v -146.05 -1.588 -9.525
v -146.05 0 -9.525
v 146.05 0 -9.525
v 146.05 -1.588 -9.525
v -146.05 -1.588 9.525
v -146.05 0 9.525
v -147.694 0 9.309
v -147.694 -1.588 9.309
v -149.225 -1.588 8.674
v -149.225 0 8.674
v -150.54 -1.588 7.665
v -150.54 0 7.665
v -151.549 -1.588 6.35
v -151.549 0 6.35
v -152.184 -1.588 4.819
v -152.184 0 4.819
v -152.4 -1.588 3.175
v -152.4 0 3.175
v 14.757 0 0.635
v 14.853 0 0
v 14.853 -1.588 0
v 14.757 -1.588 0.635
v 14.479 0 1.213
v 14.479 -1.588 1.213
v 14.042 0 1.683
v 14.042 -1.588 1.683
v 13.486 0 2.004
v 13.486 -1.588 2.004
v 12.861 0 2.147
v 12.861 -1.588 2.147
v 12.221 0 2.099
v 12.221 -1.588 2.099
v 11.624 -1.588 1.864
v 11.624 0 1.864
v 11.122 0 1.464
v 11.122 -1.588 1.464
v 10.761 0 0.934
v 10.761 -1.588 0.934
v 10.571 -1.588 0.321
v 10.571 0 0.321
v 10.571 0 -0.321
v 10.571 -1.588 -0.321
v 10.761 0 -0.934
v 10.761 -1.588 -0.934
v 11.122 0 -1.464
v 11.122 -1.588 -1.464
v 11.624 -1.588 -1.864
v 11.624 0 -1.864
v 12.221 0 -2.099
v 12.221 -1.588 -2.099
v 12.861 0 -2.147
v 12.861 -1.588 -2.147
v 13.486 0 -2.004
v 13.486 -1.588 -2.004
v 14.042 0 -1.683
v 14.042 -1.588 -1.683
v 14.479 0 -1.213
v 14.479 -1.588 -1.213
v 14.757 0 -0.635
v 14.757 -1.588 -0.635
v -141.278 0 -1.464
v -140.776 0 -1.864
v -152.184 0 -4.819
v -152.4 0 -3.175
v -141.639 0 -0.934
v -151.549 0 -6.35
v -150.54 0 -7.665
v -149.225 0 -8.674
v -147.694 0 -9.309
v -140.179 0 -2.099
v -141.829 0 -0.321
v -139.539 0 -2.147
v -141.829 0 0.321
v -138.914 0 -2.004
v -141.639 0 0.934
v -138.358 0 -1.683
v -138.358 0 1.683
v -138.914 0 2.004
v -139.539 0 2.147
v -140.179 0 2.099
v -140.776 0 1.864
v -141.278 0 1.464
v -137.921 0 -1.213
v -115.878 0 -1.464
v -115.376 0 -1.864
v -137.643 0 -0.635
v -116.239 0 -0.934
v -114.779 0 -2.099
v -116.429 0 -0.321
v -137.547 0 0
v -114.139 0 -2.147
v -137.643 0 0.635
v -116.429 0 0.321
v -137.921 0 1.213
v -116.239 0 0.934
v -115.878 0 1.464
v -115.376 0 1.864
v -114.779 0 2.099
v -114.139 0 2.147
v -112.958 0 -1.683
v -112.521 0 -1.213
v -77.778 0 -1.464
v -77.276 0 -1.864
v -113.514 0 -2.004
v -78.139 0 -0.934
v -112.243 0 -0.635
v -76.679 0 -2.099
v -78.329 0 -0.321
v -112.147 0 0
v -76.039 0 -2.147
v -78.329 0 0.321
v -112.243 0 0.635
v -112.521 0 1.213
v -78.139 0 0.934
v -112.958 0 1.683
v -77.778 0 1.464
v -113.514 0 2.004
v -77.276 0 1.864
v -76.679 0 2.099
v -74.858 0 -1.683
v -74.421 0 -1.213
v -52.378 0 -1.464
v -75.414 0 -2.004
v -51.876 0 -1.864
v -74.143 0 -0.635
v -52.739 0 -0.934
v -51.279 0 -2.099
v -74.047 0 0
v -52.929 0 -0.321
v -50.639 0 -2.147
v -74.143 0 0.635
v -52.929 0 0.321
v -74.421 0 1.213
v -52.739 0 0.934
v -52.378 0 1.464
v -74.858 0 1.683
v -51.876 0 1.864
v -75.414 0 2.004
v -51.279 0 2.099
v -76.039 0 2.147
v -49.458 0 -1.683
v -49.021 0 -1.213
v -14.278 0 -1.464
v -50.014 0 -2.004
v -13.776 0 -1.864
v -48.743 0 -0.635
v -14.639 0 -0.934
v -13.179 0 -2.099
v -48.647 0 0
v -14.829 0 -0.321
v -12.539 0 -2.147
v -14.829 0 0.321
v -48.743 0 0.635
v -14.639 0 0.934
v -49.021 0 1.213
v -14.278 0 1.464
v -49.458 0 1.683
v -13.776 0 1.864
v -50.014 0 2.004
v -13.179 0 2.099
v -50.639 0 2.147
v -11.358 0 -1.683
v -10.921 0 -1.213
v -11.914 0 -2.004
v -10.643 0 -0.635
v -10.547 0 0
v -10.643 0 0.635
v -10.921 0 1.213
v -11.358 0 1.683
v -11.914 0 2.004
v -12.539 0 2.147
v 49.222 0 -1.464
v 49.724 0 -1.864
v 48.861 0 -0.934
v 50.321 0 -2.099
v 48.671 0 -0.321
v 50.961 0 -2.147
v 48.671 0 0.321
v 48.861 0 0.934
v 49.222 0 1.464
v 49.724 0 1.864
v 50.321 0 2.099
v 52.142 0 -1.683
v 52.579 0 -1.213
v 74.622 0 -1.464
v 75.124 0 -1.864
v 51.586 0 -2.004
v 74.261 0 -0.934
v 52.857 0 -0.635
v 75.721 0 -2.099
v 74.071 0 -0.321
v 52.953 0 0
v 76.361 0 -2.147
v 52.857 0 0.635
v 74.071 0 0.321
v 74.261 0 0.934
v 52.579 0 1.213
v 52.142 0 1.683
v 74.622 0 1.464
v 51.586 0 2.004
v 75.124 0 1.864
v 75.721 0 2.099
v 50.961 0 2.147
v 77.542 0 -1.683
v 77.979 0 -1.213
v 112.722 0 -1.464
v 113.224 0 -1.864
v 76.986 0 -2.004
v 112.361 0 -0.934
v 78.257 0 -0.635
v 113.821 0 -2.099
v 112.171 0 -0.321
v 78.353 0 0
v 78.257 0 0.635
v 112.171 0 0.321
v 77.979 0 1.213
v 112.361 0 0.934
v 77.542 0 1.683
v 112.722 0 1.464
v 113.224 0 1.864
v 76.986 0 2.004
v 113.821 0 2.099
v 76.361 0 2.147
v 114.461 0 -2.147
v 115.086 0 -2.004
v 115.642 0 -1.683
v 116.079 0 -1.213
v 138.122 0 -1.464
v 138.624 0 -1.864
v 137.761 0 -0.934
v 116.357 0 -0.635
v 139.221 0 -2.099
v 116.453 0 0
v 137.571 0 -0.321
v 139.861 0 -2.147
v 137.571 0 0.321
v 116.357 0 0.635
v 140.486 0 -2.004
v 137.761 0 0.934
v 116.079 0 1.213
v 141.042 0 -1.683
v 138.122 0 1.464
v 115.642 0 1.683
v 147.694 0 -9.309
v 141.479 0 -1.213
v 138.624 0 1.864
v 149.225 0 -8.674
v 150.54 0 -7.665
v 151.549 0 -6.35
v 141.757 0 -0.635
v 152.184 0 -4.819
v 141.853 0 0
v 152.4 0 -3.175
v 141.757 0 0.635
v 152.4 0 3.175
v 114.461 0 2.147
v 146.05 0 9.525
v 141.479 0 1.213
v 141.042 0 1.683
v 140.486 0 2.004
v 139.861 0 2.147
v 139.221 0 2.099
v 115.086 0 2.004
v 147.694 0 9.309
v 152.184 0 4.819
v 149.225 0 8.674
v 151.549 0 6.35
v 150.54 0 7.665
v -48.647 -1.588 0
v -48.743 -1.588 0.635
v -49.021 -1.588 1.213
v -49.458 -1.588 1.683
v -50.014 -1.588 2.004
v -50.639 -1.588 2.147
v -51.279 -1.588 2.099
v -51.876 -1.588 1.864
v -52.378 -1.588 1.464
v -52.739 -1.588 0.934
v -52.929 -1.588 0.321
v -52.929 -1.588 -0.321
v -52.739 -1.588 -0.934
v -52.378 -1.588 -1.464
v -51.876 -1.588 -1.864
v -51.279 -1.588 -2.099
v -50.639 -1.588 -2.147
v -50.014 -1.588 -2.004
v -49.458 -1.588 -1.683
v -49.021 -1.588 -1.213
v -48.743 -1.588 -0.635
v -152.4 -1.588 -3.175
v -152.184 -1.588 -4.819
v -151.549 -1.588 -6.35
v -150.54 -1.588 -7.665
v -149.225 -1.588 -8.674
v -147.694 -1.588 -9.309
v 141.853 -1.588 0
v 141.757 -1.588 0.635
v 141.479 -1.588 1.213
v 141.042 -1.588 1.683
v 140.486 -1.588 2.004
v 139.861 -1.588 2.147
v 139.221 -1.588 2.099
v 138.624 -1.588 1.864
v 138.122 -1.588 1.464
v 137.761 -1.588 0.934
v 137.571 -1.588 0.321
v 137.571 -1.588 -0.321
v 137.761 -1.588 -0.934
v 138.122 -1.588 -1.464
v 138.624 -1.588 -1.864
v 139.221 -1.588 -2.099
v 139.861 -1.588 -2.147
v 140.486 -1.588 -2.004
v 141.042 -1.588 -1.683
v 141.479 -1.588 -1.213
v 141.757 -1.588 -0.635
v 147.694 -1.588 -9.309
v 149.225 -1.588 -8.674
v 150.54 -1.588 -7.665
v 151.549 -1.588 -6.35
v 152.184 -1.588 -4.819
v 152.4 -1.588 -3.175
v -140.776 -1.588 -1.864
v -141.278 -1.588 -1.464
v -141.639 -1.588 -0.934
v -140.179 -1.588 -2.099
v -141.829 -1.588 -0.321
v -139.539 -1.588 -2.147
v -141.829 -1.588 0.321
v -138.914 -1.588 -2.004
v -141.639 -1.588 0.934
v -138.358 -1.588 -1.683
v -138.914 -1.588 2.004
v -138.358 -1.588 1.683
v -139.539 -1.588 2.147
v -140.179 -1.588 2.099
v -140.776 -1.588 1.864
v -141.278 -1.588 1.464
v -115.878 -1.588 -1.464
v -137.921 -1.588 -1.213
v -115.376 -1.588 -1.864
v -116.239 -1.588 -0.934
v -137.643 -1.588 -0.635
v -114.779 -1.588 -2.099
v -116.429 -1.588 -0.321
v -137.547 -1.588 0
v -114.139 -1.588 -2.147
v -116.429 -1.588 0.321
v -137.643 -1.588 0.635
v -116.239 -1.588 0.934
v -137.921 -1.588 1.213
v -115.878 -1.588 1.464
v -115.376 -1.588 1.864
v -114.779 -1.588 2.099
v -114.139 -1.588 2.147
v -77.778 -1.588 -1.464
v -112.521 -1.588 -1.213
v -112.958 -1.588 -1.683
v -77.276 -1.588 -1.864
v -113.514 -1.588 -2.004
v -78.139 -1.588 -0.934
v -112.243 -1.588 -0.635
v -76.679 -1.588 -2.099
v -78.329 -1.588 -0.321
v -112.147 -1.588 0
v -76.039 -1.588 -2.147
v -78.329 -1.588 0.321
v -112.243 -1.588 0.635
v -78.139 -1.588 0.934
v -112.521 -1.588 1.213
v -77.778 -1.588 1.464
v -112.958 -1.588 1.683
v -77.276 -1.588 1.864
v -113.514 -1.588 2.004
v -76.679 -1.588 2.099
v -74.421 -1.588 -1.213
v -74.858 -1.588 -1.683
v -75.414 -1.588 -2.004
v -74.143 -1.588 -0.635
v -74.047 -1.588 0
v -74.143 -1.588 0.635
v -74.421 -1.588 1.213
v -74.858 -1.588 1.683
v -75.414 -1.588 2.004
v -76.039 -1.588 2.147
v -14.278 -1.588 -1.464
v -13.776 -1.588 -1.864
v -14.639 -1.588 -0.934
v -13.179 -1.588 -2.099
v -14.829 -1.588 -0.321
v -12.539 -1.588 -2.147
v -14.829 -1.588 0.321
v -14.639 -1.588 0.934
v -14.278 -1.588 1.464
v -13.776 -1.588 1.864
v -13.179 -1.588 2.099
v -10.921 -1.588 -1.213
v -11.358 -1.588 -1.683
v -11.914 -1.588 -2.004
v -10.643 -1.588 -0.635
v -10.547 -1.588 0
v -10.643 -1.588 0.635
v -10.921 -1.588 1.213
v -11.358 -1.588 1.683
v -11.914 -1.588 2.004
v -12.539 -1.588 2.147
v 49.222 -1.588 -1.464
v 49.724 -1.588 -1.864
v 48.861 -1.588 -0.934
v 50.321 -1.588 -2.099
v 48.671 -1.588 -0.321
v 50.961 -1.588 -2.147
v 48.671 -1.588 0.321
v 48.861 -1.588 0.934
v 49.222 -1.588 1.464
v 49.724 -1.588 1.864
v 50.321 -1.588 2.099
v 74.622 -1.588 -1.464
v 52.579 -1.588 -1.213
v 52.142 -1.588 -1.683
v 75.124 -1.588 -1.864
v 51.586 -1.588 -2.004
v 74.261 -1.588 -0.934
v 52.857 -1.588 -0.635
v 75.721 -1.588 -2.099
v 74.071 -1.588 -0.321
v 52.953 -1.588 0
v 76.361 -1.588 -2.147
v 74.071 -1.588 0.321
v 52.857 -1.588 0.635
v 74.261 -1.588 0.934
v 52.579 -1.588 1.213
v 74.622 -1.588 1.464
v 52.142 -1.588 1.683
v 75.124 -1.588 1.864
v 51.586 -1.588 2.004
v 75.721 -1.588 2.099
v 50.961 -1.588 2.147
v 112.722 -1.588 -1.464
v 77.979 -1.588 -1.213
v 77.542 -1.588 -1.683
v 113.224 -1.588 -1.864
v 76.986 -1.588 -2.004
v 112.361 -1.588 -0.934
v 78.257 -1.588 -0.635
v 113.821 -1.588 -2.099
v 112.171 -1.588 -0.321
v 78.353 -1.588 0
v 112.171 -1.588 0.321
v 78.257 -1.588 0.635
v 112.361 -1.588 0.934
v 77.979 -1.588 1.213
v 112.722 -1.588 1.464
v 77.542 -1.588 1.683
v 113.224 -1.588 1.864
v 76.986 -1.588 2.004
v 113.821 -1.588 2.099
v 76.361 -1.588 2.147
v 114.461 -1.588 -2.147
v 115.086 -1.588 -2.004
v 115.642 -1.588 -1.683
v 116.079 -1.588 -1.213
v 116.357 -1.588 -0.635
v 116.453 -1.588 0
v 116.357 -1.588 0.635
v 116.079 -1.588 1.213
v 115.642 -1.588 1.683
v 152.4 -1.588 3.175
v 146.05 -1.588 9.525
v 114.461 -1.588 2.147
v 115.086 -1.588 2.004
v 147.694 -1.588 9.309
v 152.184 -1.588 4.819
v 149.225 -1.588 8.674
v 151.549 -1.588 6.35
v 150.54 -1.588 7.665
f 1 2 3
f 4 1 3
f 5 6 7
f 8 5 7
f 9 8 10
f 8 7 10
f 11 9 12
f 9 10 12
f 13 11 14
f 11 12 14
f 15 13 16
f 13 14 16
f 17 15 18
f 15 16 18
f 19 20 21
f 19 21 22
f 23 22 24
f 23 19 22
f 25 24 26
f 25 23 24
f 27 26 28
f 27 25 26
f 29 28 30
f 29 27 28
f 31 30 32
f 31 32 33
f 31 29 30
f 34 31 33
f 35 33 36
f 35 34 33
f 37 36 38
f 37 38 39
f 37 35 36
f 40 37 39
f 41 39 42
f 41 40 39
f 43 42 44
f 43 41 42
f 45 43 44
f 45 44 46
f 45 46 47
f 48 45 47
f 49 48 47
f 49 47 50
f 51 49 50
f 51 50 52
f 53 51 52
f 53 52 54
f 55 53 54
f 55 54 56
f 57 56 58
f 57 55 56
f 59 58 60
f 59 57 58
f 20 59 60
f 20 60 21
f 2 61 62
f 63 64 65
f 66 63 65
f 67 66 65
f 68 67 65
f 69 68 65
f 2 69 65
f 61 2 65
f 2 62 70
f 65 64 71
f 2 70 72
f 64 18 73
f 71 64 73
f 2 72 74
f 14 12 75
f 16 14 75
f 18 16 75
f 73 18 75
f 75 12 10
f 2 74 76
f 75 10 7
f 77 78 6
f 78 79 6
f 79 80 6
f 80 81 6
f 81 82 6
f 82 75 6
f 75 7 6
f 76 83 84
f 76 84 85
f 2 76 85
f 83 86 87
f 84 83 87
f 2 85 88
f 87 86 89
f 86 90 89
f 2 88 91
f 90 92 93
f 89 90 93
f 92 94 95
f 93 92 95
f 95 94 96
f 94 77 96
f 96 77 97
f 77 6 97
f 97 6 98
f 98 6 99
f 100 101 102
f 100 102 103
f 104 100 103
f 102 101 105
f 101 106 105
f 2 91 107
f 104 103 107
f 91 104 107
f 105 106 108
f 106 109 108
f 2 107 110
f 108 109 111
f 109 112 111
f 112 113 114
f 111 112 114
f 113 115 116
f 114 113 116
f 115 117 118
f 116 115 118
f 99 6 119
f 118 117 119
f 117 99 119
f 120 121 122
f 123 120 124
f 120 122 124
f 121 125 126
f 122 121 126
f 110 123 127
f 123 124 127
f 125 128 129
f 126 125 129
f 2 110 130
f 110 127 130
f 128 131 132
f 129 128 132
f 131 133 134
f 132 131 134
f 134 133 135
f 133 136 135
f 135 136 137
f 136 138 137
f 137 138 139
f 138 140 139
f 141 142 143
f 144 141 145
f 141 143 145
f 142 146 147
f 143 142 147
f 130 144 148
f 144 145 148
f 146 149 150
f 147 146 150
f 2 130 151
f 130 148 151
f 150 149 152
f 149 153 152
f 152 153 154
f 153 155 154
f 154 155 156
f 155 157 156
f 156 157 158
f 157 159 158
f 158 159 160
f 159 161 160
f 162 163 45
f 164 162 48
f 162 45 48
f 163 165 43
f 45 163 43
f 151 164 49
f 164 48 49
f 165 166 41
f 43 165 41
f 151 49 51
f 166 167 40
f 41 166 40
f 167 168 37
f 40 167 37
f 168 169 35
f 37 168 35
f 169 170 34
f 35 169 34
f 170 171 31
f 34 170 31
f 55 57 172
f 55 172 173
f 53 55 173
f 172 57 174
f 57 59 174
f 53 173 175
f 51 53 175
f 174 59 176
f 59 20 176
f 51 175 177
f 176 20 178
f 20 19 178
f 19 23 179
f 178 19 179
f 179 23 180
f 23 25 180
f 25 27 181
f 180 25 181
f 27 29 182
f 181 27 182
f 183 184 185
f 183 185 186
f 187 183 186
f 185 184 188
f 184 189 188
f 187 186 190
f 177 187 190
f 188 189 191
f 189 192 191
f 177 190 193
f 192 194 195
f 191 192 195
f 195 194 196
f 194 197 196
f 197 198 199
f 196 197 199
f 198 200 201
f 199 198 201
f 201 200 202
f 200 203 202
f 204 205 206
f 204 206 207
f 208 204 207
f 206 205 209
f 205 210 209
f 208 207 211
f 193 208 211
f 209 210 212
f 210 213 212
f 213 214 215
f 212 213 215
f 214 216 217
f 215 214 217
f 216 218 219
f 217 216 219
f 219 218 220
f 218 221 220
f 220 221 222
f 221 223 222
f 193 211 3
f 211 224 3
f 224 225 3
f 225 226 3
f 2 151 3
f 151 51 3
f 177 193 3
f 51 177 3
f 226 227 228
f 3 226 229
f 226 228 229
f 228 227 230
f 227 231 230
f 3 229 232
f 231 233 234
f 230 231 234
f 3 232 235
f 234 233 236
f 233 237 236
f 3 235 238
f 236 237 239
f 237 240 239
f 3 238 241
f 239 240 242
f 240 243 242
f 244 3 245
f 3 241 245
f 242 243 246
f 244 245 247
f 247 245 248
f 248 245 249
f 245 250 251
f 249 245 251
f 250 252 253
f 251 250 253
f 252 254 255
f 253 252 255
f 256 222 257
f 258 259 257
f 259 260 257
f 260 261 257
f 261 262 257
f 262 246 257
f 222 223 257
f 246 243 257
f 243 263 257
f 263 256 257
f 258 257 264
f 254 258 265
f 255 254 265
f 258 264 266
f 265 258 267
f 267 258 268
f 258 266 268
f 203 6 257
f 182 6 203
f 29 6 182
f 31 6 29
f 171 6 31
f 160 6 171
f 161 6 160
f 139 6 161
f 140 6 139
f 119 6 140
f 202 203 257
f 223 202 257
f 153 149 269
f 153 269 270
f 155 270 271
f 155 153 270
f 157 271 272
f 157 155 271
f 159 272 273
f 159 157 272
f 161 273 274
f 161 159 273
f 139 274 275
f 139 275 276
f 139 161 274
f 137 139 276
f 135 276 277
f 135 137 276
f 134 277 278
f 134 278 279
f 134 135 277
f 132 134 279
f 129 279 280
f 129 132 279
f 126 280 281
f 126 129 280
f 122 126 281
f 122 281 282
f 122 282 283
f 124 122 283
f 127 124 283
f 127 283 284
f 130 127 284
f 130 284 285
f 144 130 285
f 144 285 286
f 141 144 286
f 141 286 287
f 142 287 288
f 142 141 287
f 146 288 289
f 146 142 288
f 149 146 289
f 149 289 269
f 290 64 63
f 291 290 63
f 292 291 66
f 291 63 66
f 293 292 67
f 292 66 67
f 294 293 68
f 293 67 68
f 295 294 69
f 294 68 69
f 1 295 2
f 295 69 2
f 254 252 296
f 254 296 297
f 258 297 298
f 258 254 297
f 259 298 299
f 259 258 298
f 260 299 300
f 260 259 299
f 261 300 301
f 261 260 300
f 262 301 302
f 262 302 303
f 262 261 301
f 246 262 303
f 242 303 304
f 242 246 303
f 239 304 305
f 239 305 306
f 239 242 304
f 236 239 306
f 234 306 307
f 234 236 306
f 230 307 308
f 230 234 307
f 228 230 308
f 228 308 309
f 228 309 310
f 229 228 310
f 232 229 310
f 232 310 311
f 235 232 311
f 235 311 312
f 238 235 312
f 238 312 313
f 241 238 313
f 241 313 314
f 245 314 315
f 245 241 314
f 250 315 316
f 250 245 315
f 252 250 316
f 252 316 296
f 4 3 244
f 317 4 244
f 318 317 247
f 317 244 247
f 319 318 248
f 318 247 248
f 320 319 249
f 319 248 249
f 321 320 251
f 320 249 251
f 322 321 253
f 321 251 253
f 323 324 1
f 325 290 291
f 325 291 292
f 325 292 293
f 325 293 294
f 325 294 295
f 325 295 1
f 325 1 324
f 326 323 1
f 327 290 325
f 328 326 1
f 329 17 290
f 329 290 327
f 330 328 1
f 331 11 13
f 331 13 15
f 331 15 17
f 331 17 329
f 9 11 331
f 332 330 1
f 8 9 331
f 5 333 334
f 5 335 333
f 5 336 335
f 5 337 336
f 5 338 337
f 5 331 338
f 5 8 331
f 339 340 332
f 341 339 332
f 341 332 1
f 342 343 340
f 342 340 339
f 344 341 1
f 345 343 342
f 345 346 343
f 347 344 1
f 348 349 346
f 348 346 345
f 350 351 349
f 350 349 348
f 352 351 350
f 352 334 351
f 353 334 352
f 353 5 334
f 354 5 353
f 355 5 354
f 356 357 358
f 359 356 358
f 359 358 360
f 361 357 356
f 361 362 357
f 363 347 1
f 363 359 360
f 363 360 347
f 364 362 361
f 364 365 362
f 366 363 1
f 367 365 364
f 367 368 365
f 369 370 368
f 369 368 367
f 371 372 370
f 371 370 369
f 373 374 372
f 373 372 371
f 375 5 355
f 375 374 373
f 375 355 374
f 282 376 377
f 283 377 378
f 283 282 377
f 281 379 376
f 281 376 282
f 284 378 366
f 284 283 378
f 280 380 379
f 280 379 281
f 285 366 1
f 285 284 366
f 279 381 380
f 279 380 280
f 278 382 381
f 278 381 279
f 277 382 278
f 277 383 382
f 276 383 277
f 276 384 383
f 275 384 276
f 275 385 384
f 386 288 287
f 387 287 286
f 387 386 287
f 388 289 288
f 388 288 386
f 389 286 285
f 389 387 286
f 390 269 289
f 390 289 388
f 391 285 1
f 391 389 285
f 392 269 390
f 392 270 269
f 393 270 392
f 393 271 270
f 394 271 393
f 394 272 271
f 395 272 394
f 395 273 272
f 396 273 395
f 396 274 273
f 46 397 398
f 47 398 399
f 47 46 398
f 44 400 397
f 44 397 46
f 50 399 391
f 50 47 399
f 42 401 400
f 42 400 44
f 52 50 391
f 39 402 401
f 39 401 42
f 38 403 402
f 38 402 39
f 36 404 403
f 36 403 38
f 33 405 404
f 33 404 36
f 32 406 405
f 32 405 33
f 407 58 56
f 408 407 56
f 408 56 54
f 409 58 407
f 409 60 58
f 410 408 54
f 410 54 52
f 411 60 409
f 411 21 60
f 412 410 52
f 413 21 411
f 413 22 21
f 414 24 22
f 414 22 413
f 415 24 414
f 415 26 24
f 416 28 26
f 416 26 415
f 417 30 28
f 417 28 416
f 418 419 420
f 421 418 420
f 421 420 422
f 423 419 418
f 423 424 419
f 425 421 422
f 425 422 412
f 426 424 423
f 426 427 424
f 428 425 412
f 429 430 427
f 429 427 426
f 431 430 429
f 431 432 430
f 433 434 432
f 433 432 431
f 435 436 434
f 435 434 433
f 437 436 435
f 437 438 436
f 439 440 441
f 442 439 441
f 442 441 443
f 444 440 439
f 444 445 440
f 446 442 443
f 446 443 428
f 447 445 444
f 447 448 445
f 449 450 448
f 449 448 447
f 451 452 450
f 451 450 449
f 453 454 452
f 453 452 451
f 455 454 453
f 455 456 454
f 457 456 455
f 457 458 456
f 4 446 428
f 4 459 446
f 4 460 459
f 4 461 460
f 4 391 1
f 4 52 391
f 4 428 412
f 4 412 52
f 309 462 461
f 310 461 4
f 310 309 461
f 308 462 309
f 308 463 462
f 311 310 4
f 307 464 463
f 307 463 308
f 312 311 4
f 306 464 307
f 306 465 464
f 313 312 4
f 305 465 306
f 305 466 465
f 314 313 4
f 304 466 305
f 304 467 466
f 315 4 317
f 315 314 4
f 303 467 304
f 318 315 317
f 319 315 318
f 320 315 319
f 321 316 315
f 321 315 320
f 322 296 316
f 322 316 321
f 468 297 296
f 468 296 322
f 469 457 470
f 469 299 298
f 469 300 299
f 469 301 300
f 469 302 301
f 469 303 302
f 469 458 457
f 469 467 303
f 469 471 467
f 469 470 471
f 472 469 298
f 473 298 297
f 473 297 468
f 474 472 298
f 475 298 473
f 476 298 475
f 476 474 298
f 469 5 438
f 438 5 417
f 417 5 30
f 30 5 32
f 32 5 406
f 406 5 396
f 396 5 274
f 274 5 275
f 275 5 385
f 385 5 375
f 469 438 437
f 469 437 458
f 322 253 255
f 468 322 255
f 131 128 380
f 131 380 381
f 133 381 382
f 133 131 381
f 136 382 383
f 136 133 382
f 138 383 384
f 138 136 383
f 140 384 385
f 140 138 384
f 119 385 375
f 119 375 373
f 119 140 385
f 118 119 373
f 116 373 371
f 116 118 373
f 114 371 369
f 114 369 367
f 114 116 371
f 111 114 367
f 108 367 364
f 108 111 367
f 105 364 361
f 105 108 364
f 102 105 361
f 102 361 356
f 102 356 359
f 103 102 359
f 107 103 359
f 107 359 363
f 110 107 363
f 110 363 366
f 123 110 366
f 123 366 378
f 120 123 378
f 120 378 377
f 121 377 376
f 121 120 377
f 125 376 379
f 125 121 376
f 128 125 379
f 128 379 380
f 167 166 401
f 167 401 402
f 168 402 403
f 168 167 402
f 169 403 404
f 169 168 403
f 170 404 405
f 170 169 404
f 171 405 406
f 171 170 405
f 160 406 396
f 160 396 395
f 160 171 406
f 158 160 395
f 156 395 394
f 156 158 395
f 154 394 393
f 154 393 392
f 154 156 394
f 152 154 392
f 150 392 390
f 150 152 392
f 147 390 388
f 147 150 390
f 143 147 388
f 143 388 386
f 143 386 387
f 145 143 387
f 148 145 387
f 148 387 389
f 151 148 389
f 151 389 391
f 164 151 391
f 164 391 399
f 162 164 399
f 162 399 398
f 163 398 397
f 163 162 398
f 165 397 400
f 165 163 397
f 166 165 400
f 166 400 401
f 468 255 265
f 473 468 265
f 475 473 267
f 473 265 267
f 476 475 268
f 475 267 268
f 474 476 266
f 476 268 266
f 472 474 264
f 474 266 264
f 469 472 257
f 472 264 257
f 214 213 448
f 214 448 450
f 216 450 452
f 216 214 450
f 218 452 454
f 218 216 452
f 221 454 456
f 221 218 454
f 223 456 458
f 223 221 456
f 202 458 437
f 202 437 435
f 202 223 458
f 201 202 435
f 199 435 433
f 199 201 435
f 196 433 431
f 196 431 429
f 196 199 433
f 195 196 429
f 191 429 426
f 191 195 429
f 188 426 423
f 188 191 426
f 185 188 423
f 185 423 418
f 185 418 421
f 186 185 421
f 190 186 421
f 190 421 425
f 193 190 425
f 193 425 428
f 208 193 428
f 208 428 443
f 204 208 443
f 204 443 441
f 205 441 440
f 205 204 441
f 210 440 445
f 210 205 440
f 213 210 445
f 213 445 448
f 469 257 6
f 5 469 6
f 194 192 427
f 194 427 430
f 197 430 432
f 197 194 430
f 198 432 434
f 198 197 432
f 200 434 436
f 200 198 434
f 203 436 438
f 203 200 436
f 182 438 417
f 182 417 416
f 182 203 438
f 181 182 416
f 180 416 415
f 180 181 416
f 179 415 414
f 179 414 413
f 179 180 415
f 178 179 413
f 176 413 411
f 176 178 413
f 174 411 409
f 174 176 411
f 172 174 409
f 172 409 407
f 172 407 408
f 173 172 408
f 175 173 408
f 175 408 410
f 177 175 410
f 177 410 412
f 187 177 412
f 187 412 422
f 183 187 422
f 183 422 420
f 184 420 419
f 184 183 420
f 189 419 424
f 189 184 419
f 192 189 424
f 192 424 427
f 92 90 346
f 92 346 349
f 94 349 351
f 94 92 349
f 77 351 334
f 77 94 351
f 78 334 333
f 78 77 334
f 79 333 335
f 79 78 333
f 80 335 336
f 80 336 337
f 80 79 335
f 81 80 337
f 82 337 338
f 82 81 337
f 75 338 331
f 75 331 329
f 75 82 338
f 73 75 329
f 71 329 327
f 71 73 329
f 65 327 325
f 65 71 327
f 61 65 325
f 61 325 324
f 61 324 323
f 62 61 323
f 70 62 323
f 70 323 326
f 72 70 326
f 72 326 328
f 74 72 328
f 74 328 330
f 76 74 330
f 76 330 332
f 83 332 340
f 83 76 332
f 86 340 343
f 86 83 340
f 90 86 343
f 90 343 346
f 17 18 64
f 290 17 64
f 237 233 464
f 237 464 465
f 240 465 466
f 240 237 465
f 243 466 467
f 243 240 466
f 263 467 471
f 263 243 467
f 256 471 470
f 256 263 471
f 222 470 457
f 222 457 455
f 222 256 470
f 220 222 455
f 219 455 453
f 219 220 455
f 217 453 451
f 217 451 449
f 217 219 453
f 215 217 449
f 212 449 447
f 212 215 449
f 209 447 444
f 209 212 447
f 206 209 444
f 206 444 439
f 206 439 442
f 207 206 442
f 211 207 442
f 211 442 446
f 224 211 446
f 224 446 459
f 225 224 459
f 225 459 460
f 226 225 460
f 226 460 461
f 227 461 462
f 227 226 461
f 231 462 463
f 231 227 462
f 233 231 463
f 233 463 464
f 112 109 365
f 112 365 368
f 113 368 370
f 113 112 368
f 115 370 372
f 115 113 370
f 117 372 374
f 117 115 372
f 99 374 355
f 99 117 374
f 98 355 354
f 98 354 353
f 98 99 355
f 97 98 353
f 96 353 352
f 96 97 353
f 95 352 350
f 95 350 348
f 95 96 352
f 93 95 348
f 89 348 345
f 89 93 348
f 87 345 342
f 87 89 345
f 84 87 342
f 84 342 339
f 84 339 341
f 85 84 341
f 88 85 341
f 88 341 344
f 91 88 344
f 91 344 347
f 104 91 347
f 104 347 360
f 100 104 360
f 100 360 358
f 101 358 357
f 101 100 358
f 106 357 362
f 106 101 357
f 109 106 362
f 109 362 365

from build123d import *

# Parameters (mm, degrees)
F0_R     = 2.15265
F1_DEPTH = 1.5875


with BuildPart() as f1:
    # F0 (on Front) → F1 (new body)
    with BuildSketch(Plane.XZ):
        with BuildLine():
            Line((146.05, 9.525), (-146.05, 9.525))
            ThreePointArc((-146.05, 9.525), (-150.540128, 7.665128), (-152.4, 3.175))
            Line((-152.4, 3.175), (-152.4, -3.175))
            ThreePointArc((-152.4, -3.175), (-150.540128, -7.665128), (-146.05, -9.525))
            Line((-146.05, -9.525), (-82.55, -9.525))
            Line((-82.55, -9.525), (-19.05, -9.525))
            Line((-19.05, -9.525), (146.05, -9.525))
            ThreePointArc((146.05, -9.525), (150.540128, -7.665128), (152.4, -3.175))
            Line((152.4, -3.175), (152.4, 3.175))
            ThreePointArc((152.4, 3.175), (150.540128, 7.665128), (146.05, 9.525))
        make_face()
        with Locations((-139.7, 0)):
            Circle(F0_R, mode=Mode.SUBTRACT)
        with Locations((-114.3, 0)):
            Circle(F0_R, mode=Mode.SUBTRACT)
        with Locations((-76.2, 0)):
            Circle(F0_R, mode=Mode.SUBTRACT)
        with Locations((-50.8, 0)):
            Circle(F0_R, mode=Mode.SUBTRACT)
        with Locations((-12.7, 0)):
            Circle(F0_R, mode=Mode.SUBTRACT)
        with Locations((12.7, 0)):
            Circle(F0_R, mode=Mode.SUBTRACT)
        with Locations((50.8, 0)):
            Circle(F0_R, mode=Mode.SUBTRACT)
        with Locations((76.2, 0)):
            Circle(F0_R, mode=Mode.SUBTRACT)
        with Locations((114.3, 0)):
            Circle(F0_R, mode=Mode.SUBTRACT)
        with Locations((139.7, 0)):
            Circle(F0_R, mode=Mode.SUBTRACT)
    extrude(amount=F1_DEPTH)


solid = f1.part
